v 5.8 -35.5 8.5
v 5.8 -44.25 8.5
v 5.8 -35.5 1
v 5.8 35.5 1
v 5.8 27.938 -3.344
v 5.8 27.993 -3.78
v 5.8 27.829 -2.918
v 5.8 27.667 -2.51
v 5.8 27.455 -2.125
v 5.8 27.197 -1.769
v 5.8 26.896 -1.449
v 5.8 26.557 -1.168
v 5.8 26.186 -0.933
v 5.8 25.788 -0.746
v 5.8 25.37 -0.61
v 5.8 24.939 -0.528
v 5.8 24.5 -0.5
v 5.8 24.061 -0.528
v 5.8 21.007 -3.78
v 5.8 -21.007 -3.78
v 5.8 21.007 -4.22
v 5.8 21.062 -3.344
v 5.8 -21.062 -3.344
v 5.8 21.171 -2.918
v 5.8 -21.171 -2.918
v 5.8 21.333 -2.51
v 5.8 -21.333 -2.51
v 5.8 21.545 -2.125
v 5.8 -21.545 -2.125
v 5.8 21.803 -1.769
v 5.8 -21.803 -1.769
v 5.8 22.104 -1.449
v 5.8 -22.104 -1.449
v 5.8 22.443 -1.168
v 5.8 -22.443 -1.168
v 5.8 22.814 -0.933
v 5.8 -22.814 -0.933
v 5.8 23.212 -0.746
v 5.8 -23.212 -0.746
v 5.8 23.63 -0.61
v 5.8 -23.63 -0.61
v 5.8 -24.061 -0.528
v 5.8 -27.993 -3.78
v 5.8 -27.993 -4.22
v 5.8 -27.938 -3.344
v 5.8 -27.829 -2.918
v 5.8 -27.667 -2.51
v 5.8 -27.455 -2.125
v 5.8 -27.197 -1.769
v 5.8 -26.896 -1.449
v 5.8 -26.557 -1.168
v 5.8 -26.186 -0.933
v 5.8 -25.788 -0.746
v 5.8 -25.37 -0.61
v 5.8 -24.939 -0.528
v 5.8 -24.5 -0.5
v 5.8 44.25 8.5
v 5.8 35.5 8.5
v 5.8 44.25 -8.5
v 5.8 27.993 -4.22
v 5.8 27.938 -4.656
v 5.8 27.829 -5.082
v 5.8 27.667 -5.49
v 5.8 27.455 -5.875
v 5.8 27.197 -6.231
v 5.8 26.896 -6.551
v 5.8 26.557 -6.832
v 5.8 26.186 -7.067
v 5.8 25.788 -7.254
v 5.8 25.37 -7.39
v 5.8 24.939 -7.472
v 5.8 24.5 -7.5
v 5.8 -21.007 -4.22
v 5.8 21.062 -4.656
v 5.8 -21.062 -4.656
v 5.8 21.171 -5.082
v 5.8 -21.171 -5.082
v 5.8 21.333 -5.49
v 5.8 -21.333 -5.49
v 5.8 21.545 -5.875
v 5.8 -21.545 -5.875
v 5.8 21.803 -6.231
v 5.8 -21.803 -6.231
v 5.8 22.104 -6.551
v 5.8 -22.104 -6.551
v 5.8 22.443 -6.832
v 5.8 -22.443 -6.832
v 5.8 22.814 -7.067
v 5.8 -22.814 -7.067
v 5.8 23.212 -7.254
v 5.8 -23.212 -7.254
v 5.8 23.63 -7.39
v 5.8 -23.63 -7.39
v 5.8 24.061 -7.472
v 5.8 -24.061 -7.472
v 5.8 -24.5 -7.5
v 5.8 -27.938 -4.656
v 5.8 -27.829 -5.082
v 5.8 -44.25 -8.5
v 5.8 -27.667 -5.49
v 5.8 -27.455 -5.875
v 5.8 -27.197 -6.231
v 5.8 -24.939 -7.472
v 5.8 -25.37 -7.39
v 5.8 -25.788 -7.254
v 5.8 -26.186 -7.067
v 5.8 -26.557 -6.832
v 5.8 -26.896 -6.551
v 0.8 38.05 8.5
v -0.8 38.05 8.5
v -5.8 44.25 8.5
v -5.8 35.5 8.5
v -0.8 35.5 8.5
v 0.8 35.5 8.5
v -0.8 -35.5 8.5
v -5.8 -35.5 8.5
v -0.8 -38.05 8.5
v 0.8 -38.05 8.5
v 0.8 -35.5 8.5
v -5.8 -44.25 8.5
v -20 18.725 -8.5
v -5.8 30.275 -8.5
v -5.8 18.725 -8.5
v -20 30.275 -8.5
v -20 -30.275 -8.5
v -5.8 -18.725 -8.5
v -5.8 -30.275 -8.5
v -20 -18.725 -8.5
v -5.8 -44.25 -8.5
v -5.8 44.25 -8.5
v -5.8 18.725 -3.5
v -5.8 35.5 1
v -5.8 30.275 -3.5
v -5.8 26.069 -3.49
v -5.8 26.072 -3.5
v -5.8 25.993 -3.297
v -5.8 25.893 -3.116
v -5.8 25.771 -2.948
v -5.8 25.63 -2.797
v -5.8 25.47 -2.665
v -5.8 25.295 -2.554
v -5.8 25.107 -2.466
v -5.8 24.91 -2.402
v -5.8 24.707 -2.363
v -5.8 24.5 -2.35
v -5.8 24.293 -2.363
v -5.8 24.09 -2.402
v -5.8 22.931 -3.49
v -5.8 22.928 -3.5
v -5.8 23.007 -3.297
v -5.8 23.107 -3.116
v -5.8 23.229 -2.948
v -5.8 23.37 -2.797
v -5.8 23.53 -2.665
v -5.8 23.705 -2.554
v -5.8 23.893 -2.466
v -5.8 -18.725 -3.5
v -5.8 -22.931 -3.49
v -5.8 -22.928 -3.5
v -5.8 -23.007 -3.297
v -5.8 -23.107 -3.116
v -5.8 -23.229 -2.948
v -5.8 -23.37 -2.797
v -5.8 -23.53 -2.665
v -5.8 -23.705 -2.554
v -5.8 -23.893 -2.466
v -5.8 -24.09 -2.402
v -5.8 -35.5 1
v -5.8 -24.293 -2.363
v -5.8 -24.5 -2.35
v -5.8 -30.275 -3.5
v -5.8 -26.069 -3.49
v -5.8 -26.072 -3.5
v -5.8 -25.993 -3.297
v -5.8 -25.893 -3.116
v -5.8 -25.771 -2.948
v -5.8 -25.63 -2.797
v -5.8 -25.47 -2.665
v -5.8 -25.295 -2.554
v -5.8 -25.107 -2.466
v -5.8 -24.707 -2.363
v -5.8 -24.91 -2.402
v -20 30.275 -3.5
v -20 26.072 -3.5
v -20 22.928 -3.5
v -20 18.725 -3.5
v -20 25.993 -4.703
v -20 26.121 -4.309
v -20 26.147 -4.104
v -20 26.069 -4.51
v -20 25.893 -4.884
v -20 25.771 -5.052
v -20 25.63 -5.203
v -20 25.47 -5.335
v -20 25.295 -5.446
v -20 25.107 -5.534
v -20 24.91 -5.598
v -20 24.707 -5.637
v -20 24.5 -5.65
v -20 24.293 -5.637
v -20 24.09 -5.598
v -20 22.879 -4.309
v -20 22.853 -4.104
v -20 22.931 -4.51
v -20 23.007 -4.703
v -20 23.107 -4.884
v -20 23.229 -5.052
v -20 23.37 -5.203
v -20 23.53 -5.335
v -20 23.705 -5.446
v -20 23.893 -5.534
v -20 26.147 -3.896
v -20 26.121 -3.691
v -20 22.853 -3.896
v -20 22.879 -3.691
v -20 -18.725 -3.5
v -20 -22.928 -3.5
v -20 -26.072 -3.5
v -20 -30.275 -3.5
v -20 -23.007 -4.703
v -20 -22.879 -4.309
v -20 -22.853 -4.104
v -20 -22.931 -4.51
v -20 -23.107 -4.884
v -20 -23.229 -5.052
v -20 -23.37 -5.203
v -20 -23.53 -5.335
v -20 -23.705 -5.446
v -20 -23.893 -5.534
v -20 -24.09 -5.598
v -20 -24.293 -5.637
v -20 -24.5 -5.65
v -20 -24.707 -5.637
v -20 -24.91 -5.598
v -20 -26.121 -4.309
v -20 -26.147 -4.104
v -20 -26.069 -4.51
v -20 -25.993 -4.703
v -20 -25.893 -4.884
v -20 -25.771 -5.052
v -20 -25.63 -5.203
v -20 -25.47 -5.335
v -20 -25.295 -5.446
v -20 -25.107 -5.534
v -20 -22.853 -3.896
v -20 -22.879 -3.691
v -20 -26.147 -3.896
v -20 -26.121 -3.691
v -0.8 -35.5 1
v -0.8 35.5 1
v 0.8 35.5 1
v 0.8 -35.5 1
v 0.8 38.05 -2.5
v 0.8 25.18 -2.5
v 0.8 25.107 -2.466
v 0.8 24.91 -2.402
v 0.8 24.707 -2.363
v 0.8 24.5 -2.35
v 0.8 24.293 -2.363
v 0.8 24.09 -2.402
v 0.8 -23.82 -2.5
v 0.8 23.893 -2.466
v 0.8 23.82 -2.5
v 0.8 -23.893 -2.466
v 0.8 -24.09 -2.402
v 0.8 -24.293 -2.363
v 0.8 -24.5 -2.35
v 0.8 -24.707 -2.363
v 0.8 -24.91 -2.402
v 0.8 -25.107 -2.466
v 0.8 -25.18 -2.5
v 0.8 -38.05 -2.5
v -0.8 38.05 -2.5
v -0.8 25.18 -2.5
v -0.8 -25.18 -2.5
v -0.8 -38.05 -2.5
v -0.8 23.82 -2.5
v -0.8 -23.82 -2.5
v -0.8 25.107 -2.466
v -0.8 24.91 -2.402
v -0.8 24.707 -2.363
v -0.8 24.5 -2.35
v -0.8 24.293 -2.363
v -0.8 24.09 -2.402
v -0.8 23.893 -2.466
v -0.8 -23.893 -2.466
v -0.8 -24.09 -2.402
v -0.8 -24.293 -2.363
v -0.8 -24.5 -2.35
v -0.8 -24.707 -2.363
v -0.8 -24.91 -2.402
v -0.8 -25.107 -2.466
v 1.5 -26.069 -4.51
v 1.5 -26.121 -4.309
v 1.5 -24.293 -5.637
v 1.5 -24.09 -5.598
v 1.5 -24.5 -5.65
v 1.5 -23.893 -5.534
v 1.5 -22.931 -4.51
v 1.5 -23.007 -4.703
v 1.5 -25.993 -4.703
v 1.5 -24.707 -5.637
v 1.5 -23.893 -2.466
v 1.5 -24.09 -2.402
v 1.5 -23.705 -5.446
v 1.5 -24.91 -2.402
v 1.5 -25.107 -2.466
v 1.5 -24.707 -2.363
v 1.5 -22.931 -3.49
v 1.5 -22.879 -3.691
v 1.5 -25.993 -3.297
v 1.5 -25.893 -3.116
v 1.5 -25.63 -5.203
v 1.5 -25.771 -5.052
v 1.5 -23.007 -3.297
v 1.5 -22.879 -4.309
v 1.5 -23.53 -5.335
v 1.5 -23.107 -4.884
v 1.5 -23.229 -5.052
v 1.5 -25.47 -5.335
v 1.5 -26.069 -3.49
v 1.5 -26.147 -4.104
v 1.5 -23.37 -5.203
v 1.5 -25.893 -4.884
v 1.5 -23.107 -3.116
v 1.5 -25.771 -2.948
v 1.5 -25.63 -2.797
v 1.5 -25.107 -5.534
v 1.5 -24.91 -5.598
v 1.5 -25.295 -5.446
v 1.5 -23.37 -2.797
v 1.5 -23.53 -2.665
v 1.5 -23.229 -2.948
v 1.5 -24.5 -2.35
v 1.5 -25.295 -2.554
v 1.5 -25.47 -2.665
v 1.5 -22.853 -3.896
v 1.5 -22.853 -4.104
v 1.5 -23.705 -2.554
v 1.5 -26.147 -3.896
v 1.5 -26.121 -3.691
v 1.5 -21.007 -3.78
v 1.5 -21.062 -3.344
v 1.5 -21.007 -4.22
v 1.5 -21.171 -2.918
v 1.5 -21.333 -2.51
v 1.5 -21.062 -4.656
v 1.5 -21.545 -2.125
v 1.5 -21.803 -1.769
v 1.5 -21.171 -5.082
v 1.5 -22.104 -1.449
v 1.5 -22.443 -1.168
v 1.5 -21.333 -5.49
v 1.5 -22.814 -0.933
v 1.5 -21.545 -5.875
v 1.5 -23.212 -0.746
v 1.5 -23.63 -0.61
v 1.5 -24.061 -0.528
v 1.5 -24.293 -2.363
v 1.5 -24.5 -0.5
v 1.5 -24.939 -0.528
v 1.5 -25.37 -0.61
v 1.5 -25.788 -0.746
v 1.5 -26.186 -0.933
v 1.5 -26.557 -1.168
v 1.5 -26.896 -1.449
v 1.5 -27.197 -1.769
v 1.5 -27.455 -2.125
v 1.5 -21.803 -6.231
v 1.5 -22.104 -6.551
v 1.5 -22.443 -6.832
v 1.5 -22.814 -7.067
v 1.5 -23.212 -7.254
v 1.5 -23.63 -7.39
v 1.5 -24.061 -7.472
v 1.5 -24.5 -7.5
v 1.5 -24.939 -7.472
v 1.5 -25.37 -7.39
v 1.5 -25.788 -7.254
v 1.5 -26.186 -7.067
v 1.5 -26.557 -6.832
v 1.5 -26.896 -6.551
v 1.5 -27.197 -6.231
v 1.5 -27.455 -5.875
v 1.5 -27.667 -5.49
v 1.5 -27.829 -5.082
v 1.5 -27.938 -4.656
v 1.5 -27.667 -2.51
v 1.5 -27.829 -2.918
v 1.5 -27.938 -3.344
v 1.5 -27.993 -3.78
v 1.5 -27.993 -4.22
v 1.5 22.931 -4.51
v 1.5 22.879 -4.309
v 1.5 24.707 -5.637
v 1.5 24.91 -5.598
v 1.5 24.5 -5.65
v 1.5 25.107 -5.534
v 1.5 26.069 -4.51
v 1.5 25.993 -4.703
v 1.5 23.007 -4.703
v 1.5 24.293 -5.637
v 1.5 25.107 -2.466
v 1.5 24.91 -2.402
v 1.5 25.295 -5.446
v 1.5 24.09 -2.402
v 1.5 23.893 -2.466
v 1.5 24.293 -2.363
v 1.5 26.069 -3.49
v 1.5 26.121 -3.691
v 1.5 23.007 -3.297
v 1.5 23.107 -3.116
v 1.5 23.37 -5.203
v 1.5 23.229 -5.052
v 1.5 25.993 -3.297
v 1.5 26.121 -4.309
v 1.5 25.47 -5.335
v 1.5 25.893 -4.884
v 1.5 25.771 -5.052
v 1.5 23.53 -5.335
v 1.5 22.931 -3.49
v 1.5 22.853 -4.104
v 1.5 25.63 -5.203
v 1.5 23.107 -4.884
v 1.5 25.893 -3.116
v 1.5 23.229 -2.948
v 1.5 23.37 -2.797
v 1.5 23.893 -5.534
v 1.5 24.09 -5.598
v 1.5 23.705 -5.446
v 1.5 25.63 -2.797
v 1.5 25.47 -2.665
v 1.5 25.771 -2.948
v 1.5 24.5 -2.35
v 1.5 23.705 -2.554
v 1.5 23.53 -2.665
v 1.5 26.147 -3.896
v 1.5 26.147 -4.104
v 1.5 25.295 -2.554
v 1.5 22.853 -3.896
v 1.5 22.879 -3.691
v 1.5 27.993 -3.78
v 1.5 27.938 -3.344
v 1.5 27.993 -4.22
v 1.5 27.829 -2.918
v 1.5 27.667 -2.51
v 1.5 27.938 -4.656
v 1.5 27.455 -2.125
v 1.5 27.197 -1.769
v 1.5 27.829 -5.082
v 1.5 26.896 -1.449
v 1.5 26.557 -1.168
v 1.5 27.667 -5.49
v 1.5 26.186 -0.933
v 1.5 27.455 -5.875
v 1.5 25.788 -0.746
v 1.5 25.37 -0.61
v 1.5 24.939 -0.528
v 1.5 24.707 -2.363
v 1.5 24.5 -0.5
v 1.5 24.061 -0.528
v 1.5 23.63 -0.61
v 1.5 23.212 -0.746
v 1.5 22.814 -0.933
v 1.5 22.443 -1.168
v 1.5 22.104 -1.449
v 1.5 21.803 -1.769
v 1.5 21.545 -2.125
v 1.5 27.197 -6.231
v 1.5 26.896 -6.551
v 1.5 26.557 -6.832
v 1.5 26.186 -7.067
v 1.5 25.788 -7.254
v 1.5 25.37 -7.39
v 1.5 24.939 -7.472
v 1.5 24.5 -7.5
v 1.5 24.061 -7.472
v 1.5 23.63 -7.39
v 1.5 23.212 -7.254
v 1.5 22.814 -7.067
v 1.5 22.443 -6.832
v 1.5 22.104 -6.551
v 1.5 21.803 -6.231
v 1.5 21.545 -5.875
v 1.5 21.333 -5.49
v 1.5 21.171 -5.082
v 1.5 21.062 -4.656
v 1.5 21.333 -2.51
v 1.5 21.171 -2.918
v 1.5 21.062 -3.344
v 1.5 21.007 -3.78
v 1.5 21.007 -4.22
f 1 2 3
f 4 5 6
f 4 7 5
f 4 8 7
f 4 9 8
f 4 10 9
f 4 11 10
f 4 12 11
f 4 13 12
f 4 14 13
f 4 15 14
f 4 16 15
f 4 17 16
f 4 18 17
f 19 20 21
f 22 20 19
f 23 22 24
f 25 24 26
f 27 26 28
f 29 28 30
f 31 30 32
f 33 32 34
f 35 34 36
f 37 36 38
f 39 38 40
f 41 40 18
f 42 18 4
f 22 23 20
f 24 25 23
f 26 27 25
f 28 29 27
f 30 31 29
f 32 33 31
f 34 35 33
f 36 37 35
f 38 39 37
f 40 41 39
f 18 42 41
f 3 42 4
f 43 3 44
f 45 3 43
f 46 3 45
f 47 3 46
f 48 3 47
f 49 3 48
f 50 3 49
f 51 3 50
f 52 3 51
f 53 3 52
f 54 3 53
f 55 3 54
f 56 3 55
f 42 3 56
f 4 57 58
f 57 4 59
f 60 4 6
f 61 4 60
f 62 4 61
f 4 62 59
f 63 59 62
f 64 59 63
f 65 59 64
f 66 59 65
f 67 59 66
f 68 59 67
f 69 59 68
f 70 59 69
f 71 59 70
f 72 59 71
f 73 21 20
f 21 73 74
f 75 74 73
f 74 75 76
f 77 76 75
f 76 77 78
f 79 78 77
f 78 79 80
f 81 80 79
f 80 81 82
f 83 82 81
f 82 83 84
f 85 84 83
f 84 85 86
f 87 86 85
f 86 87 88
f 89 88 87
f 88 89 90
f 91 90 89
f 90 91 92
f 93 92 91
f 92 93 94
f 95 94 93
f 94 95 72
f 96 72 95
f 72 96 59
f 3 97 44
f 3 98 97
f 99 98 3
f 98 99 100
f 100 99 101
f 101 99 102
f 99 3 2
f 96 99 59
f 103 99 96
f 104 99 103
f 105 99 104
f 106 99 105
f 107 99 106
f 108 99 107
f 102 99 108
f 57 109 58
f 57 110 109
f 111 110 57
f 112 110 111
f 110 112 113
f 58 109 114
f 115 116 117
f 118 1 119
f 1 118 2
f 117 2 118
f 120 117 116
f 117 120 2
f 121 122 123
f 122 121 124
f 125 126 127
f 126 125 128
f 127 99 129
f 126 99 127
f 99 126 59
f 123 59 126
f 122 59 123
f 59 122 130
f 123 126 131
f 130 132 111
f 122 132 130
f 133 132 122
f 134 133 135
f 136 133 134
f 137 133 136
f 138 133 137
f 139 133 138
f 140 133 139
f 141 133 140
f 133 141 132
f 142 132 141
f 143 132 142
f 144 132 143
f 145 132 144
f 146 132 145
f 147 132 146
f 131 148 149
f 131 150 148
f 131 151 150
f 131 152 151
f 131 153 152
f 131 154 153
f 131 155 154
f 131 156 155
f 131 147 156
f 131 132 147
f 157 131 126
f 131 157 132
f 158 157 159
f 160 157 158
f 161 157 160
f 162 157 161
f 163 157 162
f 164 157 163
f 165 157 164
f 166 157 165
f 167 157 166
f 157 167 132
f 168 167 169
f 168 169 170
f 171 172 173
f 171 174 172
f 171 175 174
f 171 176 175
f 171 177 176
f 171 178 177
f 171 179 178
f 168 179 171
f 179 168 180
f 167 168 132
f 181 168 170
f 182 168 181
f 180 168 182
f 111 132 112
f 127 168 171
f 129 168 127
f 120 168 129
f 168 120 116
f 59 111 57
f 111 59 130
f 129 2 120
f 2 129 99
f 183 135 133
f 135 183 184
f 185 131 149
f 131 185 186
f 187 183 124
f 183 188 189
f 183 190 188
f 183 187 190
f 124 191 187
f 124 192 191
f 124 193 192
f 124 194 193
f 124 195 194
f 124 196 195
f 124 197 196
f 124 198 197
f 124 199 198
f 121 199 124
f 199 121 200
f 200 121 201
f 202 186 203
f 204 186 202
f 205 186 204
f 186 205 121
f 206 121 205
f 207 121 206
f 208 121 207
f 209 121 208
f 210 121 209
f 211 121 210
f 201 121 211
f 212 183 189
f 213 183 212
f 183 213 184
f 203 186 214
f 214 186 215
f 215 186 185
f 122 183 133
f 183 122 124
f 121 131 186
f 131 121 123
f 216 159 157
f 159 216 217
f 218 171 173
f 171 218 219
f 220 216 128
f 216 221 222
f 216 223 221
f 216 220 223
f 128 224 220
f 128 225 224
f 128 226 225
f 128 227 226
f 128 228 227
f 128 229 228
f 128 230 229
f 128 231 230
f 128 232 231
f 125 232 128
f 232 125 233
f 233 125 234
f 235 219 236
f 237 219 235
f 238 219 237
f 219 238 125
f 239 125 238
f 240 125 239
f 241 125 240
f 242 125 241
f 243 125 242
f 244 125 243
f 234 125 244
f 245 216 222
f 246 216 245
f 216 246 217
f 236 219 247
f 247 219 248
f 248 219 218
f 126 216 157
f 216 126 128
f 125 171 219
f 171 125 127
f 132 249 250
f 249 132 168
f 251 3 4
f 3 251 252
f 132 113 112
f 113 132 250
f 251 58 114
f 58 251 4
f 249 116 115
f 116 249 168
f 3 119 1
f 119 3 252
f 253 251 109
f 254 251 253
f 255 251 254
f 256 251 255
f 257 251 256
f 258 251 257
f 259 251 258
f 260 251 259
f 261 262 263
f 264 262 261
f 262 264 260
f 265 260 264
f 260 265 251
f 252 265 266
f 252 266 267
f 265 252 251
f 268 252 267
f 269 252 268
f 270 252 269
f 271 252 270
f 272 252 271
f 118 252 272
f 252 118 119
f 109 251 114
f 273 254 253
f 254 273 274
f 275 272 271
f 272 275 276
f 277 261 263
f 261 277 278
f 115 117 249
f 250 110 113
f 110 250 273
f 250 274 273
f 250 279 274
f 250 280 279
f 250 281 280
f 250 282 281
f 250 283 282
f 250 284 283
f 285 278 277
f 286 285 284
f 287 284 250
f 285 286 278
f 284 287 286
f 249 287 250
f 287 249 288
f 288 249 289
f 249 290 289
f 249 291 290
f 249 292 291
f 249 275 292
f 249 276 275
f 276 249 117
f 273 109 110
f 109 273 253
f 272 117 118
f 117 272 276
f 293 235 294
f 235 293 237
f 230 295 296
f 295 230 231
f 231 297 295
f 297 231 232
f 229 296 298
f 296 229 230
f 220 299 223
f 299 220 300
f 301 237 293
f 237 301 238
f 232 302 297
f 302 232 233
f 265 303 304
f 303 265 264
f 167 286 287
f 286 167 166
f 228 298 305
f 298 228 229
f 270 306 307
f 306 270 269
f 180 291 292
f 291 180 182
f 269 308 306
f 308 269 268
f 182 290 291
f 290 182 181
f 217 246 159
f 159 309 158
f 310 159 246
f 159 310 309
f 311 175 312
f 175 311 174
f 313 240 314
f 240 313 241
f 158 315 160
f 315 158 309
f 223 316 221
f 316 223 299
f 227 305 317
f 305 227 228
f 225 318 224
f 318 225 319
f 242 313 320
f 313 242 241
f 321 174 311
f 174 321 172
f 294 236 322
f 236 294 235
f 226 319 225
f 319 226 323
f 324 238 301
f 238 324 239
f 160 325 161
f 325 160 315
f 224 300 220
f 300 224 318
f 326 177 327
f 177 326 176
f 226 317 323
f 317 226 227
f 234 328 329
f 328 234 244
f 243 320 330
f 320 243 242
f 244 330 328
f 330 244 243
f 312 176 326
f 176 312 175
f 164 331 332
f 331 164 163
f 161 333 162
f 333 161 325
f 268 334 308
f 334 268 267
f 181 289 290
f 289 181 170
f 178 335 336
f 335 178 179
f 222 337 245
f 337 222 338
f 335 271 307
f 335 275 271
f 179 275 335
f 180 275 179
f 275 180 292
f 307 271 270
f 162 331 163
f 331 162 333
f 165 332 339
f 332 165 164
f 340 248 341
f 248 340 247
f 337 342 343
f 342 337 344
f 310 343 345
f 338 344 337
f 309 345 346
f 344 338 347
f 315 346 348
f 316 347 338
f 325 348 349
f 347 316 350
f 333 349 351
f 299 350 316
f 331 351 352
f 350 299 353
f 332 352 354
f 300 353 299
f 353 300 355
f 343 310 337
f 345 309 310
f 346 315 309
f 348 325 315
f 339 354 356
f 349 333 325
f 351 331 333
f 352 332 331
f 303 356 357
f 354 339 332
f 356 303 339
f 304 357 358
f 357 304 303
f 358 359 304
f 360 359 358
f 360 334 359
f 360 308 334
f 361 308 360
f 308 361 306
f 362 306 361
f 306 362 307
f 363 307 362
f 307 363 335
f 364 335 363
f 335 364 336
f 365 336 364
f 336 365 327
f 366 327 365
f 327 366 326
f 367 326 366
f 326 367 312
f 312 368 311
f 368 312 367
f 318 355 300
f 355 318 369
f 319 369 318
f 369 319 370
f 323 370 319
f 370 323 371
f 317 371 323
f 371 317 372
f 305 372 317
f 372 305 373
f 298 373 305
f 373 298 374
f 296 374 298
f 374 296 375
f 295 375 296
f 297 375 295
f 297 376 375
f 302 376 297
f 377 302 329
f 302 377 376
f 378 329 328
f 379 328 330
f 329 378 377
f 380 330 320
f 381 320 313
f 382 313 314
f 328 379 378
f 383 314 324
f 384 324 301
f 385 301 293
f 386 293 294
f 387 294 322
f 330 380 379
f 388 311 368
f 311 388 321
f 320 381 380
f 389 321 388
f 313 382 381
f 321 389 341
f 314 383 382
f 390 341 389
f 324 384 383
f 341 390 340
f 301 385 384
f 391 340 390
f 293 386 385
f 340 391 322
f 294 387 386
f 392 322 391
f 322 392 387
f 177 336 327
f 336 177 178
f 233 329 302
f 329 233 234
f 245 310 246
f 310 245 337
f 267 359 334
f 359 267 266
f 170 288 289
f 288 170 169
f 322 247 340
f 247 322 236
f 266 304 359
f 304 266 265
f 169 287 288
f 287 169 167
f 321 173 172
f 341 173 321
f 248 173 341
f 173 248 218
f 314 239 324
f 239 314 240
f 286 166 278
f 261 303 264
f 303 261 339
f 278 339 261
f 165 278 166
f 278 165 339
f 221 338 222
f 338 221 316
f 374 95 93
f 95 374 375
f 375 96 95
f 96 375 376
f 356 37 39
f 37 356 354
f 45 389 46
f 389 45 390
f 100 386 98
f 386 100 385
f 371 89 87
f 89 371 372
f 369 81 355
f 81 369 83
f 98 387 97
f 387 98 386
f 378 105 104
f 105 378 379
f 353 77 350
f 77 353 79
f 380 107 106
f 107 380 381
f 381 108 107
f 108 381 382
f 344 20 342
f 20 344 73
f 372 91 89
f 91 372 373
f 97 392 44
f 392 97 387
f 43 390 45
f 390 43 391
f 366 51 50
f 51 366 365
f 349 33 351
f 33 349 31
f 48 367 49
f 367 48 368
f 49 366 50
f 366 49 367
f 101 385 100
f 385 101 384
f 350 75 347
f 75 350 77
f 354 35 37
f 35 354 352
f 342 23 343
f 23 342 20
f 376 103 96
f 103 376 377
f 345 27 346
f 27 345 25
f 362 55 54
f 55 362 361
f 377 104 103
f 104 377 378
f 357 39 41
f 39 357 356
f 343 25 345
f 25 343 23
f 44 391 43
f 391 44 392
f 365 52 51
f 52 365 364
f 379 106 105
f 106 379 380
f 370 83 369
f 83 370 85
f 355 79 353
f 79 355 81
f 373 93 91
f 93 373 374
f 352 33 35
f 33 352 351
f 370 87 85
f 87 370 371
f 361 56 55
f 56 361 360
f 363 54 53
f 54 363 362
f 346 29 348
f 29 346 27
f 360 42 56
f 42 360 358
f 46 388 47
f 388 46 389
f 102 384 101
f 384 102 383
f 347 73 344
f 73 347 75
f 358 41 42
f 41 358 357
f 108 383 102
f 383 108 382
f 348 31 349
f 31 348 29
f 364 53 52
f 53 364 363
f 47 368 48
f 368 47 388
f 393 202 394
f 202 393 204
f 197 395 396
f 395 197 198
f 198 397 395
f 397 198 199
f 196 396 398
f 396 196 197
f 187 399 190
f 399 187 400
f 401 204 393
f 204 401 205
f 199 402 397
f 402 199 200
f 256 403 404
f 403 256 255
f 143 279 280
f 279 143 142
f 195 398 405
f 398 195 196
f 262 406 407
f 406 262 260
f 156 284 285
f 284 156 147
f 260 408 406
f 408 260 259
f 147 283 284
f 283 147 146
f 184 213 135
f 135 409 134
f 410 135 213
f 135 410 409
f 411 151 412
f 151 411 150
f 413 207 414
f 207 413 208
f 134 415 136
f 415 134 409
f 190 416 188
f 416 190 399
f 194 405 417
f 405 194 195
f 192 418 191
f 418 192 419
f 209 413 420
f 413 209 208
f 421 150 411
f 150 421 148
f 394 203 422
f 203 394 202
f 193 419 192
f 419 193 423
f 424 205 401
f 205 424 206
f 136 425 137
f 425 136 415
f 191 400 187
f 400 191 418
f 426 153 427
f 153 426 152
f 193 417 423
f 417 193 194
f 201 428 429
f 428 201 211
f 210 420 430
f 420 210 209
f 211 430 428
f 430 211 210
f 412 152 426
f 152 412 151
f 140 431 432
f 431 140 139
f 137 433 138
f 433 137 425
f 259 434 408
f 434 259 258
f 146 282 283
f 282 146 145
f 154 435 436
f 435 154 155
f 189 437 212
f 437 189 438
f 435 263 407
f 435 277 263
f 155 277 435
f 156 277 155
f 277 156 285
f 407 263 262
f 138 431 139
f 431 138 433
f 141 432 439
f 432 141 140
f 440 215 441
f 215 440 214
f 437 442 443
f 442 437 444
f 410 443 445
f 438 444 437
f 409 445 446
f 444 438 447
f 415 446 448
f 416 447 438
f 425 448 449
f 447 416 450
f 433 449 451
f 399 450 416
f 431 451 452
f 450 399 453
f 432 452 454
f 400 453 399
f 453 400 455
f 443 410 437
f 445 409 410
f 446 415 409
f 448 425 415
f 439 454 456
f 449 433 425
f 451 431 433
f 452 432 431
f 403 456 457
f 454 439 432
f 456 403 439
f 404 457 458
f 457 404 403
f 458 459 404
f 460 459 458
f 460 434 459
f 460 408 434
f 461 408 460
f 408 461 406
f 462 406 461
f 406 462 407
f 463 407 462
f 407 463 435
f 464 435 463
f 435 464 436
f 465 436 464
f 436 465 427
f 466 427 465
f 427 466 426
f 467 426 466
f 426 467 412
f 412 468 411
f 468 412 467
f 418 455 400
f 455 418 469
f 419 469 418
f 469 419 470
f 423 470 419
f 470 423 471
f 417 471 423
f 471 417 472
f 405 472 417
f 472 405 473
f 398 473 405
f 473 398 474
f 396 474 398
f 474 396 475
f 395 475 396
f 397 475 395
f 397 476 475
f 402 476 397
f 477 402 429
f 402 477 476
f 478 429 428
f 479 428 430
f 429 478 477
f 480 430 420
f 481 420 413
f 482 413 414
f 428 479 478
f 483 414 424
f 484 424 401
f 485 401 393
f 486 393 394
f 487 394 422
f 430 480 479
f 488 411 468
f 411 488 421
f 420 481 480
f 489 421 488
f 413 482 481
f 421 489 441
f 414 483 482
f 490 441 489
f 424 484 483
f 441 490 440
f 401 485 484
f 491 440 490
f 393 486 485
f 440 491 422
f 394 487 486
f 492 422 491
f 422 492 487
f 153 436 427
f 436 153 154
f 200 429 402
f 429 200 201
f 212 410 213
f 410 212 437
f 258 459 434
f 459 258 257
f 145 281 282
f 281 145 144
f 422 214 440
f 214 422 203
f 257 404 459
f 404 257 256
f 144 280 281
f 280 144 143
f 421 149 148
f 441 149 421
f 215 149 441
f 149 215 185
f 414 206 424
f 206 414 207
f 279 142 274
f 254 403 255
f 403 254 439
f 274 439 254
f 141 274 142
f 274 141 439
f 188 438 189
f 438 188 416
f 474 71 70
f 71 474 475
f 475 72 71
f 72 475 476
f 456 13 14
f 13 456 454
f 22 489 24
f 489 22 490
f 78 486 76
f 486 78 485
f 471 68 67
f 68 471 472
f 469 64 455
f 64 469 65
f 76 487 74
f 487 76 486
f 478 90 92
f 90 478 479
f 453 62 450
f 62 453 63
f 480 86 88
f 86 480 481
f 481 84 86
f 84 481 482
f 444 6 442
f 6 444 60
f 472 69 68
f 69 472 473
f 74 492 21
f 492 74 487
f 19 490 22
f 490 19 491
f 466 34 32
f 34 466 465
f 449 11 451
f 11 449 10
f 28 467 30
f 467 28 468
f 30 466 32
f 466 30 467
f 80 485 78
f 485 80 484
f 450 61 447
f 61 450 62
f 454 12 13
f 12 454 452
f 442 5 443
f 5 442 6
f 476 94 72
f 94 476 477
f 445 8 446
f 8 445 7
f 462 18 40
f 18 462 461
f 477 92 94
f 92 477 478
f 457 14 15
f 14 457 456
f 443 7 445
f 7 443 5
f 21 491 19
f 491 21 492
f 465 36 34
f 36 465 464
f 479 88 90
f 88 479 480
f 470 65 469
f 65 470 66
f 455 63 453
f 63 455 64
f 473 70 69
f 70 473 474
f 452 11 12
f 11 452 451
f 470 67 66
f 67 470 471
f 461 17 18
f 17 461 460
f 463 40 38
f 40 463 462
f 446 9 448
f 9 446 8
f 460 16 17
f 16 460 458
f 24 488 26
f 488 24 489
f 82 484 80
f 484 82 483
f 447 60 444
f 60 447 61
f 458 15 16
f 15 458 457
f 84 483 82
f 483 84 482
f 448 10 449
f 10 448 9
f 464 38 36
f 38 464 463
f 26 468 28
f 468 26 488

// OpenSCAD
// file: global_variables.scad
/*
re written 3d models for the FlyPi. Making it easier to read
and to change. The main idea is simple, taking structures and variables
that are common between parts and making them into modules, 
library files. 


Created by A.M. Chagas 2017 CC BY 4.0
Derived from the original files created by T. Baden


global_variables  file has the variables that will be used 
by other parts
*/

tolerance = 0.1; // Global gap between all parts that need to slide

$fn=20;




//////////////////////////////////////////////////////////////////////////////


//variables related  to square_mount///////////////////////////////////////
//variables for the attachment where parts connect to mounting poles
posx = 18;
posy = 20;
posz = 5;
negx = 10+2*tolerance;
negy = 5+2*tolerance;
negz = posz+1;

screwd = 3.1;//2.95; // diameter of the screw used to fix the parts 

fitx_hole = 10;//x dimension of hole that will fit with the mounting poles
fity_hole = 5; //y dimension of hole that will fit with the mounting poles

fitx = 20; // x dimension of the material that will go around the mounting
          // holes
fity = 22; // y dimension of the material that will go around the mounting
          // holes
mink_dia=0; //sets the diameter of the cylinders used to round pieces up

part_border = 5; //how much larger in x and y  than the actual parts 
                  //being held the printed part is going to be
partx = 25;
party = 25;
offsety = (party+posy)/2+part_border-2;

partz  = 5; //how thick the part printed is going to be

///////raspberry pi///////////////////////////////////////////////////////////
rpiwidth = 56; // Dimensions of the RPi 2 (below also for RPi 2)

rpiholedisy = 49;
rpiholedisx = 58;
rpigrounddist = 4.2;
//////////////////////////////////////////////////////////////////////////

//////////////////CAMERA VARIABLES////////////////////////////////////
// RPi Camera Type
camx = 32.2+2*tolerance;//24 for "classic RPi Cam V1. i.e the one
                        //without the adjustable focus lens";
camy = 32.2+2*tolerance;//25 for "classic RPi Cam V1";



camxoffset = 2.50;// 2.5 for "classic RPi Cam";
cam_pcb_z = 2; // thickness of camera mount
C_Z2 = 5; // thickness of cmaera mount walls
C_ridge = 2; // width of ridge for camera mount
CamGroove_X = 12;
CamGroove_Y = 16.1;
CamGroove2_Y = 24;

MiniGrooveX = 15;

////////////////////////////////////////////////////////////////////////////




//peltier dimensions///////////////////////////////////////////////////////
peltierx = 40+1; // Size of the Peltier
peltiery = 40+1;
peltierz = 3; // Thickness of the Peltier
peltierborder = 12; // Extension in X dimension of base next to Peltier
peltierridge = 1.6; // below Peltier, width of ridge
peltiercable = 3; // thickness of Peltier cable slid
//////////////////////////////////////////////////////////////////////////////

//base///////////////////////////////////////////////////////////////////////
baseextension = 70;
basex=peltierx+2*peltierborder+partz+baseextension;
basey=rpiwidth+2*peltiercable;
basez=19;
stabid=24;

////////////////////////////////////////////////////////////////////



////////markerled////////////////////////////////////////////////////////
markerledd = 7; // diam of RGB LED hole in base
markerledz = 2; // depth beneath surface
markerx = 4; // Module A, viewhole size

///////////////////////////////////////////////////////////////////////////

///connection holes and stick dimensions////////////////////////////
conntubed=11;
conntubeh=16;
conntubed2=8.5;
stickx=10;
sticky=5;
stickz=18;
//18 short stick
//60 medium stick
//120 long stick

//ring
ring_de = 51; //external diameter of the ring
ring_di = 35; //internal diameter of the ring

////////////////////fluorescence tubes//////////////////////////

tubewall = 3;
tubed = 22;
tubeh = 30;
plugh=2;
// file: global_modules.scad
include<global_variables.scad>




$fn=50;

module screw(screwd,screwl,screwheadd,screwheadl){
cylinder(d=screwd+2*tolerance,h=screwl,center=true);
translate([0,0,screwl/2+screwheadl/2]){
cylinder(d=screwheadd,h=screwheadl,center=true);
}//translate
}//module screw


module rpiholes(){
translate([rpiholedisx/2,rpiholedisy/2,0]){
tube(tubede=screwde,tubedi=screwd,tubeh=screwh+partz/2);
}//translate

translate([rpiholedisx/2,-rpiholedisy/2,0]){
tube(tubede=screwde,tubedi=screwd,tubeh=screwh+partz/2);
}//translate

translate([-rpiholedisx/2,-rpiholedisy/2,0]){
tube(tubede=screwde,tubedi=screwd,tubeh=screwh+partz/2);
}//translate

translate([-rpiholedisx/2,rpiholedisy/2,0]){
tube(tubede=screwde,tubedi=screwd,tubeh=screwh+partz/2);
}//translate
}//module

module tube(tubede=conntubed, 
              tubedi=conntubed2, 
              tubeh=conntubeh){
    difference(){
        cylinder(d=tubede,h=tubeh,center=true);
        cylinder(d=tubedi,h=tubeh+1,center=true);
    }//difference

}//module
/*
module stabi(){
    
    difference(){
    cylinder(d=stabid,h=2*part_border-peltiercable,center=true);
    
    translate([stabid/2-(stabid/2)/2,0,0]){
    cube([stabid/2,partz,20],center=true);
    }//translate
    }//difference
}//module

module circholes(){
    cylinder(d=conntubed,h=basey+5,center=true);
    translate([0,conntubed+1,0]){
    cylinder(d=conntubed+tolerance,h=basey+5,center=true);
    }
    translate([0,-conntubed-1,0]){
    cylinder(d=conntubed+tolerance,h=basey+5,center=true);
    }

    }//module
    
 */   
module attachment(posx=posx,
                    posy=posy,
                    posz=posz,
                    negx=negx,
                    negy=negy,
                    negz=negz,
                    screwd=screwd){
    
difference(){
    //minkowski(){
    cube([posx-mink_dia,posy-mink_dia,posz-mink_dia],center=true);
      //  sphere(d=mink_dia, center=true);
        
        //}//minkowski
union(){
    translate([0,posy/5,0]){
      // minkowski(){
    cube([negx-mink_dia,negy-mink_dia,posz+mink_dia],center=true);
      // sphere(d=mink_dia,center=true);
        //    }//minkowski
    }//translate
    translate([0,posy/2,0]){
    rotate([90,0,0]){
        cylinder(d=screwd,h=posy/2,center=true,$fn=100);
        }//rotate
    }//translate
}//union

    }//difference

}//module


module main(partx=partx,
              party=party,
              partz=partz){
    
    
  //  minkowski(){

    cube([partx+2*part_border-mink_dia,
          party+2*part_border-mink_dia,
          partz],center=true);
    //rotate([0,90,0]){
    //sphere(d=mink_dia, center=true);    
    //}
    //rotate([90,0,0]){
    //cylinder(r=mink_dia,h=1, center=true);    
    //}
    //cylinder(r=mink_dia,h=1, center=true);
//}//minkowski

    
    }
  
module combined(){
    //main(partx,party,part_border,partz-1);
    main();
    translate([0,(party+posy)/2+part_border-2,0]){
    attachment(posx,posy,posz,negx,negy,negz,screwd);
    }//translate   
       
} 

       
module sideattachment(posx=posx,
                        posy=posy,
                        posz=posz,
                        negx=negx,
                        negy=negy,
                        negz=negz,
                        screwd=screwd){
    
difference(){
    //minkowski()
    {
    cube([posx-mink_dia,posy-mink_dia,posz],center=true);
      //  sphere(d=mink_dia, center=true);
    //    }//minkowski
union(){
    translate([5,posy/5,0]){
   // minkowski(){
        cube([negx+10-mink_dia,negy-mink_dia,negz],center=true);
     //   sphere(d=mink_dia,center=true);
       // }
    }//translate
    translate([0,posy/2,0]){
    rotate([90,0,0]){
        cylinder(d=screwd,h=posy/2,center=true,$fn=100);
        }//rotate
    }//translate
}//union

    }//difference

}//module

//sideattachment();
//combined();
//main();
//minkowski(){
//attachment();
//    sphere(d=1,center=true);
}
//main();
// main file
include<global_modules.scad>
//include<global_variables.scad>

pcbx=1.6;
pcby=76;
screwheadd=7;
screwheadl =5;
screwl=50;
screwd=3.1;
spacer=15;






module pcb_mount(){
difference(){
    union(){
main(partx=pcbx,
      party=pcby+part_border/2,
      partz=part_border*2+screwheadd);
translate([-spacer/2,+rpiholedisy/2,-part_border-1]){
main(partx=spacer,party=screwd/2,partz=part_border);
}//translate   
translate([-spacer/2,-rpiholedisy/2,-part_border-1]){
main(partx=spacer,party=screwd/2,partz=part_border);
}//translate
    }//union
union(){
translate([0,0,screwheadd+part_border/2]){
main(partx=pcbx+part_border+1,
      party=pcby-15,
      partz=part_border*2+screwheadd);
}//translate
translate([0,0,15-part_border/2]){
cube([pcbx,pcby+tolerance,30],center=true);
}//translate
}//union

translate([(-screwl-screwheadl+part_border)/2+1.5,
           -rpiholedisy/2,
           -part_border+1]){
rotate([0,90,0]){
    screw(screwd,screwl,screwheadd,screwheadl);
    }//rotate
}//translate
translate([(-screwl-screwheadl+part_border)/2+1.5,
           rpiholedisy/2,
           -part_border+1]){
rotate([0,90,0]){
    screw(screwd,screwl,screwheadd,screwheadl);
    }//rotate
}//translate
}//difference
}//module pcb_mount

pcb_mount();
